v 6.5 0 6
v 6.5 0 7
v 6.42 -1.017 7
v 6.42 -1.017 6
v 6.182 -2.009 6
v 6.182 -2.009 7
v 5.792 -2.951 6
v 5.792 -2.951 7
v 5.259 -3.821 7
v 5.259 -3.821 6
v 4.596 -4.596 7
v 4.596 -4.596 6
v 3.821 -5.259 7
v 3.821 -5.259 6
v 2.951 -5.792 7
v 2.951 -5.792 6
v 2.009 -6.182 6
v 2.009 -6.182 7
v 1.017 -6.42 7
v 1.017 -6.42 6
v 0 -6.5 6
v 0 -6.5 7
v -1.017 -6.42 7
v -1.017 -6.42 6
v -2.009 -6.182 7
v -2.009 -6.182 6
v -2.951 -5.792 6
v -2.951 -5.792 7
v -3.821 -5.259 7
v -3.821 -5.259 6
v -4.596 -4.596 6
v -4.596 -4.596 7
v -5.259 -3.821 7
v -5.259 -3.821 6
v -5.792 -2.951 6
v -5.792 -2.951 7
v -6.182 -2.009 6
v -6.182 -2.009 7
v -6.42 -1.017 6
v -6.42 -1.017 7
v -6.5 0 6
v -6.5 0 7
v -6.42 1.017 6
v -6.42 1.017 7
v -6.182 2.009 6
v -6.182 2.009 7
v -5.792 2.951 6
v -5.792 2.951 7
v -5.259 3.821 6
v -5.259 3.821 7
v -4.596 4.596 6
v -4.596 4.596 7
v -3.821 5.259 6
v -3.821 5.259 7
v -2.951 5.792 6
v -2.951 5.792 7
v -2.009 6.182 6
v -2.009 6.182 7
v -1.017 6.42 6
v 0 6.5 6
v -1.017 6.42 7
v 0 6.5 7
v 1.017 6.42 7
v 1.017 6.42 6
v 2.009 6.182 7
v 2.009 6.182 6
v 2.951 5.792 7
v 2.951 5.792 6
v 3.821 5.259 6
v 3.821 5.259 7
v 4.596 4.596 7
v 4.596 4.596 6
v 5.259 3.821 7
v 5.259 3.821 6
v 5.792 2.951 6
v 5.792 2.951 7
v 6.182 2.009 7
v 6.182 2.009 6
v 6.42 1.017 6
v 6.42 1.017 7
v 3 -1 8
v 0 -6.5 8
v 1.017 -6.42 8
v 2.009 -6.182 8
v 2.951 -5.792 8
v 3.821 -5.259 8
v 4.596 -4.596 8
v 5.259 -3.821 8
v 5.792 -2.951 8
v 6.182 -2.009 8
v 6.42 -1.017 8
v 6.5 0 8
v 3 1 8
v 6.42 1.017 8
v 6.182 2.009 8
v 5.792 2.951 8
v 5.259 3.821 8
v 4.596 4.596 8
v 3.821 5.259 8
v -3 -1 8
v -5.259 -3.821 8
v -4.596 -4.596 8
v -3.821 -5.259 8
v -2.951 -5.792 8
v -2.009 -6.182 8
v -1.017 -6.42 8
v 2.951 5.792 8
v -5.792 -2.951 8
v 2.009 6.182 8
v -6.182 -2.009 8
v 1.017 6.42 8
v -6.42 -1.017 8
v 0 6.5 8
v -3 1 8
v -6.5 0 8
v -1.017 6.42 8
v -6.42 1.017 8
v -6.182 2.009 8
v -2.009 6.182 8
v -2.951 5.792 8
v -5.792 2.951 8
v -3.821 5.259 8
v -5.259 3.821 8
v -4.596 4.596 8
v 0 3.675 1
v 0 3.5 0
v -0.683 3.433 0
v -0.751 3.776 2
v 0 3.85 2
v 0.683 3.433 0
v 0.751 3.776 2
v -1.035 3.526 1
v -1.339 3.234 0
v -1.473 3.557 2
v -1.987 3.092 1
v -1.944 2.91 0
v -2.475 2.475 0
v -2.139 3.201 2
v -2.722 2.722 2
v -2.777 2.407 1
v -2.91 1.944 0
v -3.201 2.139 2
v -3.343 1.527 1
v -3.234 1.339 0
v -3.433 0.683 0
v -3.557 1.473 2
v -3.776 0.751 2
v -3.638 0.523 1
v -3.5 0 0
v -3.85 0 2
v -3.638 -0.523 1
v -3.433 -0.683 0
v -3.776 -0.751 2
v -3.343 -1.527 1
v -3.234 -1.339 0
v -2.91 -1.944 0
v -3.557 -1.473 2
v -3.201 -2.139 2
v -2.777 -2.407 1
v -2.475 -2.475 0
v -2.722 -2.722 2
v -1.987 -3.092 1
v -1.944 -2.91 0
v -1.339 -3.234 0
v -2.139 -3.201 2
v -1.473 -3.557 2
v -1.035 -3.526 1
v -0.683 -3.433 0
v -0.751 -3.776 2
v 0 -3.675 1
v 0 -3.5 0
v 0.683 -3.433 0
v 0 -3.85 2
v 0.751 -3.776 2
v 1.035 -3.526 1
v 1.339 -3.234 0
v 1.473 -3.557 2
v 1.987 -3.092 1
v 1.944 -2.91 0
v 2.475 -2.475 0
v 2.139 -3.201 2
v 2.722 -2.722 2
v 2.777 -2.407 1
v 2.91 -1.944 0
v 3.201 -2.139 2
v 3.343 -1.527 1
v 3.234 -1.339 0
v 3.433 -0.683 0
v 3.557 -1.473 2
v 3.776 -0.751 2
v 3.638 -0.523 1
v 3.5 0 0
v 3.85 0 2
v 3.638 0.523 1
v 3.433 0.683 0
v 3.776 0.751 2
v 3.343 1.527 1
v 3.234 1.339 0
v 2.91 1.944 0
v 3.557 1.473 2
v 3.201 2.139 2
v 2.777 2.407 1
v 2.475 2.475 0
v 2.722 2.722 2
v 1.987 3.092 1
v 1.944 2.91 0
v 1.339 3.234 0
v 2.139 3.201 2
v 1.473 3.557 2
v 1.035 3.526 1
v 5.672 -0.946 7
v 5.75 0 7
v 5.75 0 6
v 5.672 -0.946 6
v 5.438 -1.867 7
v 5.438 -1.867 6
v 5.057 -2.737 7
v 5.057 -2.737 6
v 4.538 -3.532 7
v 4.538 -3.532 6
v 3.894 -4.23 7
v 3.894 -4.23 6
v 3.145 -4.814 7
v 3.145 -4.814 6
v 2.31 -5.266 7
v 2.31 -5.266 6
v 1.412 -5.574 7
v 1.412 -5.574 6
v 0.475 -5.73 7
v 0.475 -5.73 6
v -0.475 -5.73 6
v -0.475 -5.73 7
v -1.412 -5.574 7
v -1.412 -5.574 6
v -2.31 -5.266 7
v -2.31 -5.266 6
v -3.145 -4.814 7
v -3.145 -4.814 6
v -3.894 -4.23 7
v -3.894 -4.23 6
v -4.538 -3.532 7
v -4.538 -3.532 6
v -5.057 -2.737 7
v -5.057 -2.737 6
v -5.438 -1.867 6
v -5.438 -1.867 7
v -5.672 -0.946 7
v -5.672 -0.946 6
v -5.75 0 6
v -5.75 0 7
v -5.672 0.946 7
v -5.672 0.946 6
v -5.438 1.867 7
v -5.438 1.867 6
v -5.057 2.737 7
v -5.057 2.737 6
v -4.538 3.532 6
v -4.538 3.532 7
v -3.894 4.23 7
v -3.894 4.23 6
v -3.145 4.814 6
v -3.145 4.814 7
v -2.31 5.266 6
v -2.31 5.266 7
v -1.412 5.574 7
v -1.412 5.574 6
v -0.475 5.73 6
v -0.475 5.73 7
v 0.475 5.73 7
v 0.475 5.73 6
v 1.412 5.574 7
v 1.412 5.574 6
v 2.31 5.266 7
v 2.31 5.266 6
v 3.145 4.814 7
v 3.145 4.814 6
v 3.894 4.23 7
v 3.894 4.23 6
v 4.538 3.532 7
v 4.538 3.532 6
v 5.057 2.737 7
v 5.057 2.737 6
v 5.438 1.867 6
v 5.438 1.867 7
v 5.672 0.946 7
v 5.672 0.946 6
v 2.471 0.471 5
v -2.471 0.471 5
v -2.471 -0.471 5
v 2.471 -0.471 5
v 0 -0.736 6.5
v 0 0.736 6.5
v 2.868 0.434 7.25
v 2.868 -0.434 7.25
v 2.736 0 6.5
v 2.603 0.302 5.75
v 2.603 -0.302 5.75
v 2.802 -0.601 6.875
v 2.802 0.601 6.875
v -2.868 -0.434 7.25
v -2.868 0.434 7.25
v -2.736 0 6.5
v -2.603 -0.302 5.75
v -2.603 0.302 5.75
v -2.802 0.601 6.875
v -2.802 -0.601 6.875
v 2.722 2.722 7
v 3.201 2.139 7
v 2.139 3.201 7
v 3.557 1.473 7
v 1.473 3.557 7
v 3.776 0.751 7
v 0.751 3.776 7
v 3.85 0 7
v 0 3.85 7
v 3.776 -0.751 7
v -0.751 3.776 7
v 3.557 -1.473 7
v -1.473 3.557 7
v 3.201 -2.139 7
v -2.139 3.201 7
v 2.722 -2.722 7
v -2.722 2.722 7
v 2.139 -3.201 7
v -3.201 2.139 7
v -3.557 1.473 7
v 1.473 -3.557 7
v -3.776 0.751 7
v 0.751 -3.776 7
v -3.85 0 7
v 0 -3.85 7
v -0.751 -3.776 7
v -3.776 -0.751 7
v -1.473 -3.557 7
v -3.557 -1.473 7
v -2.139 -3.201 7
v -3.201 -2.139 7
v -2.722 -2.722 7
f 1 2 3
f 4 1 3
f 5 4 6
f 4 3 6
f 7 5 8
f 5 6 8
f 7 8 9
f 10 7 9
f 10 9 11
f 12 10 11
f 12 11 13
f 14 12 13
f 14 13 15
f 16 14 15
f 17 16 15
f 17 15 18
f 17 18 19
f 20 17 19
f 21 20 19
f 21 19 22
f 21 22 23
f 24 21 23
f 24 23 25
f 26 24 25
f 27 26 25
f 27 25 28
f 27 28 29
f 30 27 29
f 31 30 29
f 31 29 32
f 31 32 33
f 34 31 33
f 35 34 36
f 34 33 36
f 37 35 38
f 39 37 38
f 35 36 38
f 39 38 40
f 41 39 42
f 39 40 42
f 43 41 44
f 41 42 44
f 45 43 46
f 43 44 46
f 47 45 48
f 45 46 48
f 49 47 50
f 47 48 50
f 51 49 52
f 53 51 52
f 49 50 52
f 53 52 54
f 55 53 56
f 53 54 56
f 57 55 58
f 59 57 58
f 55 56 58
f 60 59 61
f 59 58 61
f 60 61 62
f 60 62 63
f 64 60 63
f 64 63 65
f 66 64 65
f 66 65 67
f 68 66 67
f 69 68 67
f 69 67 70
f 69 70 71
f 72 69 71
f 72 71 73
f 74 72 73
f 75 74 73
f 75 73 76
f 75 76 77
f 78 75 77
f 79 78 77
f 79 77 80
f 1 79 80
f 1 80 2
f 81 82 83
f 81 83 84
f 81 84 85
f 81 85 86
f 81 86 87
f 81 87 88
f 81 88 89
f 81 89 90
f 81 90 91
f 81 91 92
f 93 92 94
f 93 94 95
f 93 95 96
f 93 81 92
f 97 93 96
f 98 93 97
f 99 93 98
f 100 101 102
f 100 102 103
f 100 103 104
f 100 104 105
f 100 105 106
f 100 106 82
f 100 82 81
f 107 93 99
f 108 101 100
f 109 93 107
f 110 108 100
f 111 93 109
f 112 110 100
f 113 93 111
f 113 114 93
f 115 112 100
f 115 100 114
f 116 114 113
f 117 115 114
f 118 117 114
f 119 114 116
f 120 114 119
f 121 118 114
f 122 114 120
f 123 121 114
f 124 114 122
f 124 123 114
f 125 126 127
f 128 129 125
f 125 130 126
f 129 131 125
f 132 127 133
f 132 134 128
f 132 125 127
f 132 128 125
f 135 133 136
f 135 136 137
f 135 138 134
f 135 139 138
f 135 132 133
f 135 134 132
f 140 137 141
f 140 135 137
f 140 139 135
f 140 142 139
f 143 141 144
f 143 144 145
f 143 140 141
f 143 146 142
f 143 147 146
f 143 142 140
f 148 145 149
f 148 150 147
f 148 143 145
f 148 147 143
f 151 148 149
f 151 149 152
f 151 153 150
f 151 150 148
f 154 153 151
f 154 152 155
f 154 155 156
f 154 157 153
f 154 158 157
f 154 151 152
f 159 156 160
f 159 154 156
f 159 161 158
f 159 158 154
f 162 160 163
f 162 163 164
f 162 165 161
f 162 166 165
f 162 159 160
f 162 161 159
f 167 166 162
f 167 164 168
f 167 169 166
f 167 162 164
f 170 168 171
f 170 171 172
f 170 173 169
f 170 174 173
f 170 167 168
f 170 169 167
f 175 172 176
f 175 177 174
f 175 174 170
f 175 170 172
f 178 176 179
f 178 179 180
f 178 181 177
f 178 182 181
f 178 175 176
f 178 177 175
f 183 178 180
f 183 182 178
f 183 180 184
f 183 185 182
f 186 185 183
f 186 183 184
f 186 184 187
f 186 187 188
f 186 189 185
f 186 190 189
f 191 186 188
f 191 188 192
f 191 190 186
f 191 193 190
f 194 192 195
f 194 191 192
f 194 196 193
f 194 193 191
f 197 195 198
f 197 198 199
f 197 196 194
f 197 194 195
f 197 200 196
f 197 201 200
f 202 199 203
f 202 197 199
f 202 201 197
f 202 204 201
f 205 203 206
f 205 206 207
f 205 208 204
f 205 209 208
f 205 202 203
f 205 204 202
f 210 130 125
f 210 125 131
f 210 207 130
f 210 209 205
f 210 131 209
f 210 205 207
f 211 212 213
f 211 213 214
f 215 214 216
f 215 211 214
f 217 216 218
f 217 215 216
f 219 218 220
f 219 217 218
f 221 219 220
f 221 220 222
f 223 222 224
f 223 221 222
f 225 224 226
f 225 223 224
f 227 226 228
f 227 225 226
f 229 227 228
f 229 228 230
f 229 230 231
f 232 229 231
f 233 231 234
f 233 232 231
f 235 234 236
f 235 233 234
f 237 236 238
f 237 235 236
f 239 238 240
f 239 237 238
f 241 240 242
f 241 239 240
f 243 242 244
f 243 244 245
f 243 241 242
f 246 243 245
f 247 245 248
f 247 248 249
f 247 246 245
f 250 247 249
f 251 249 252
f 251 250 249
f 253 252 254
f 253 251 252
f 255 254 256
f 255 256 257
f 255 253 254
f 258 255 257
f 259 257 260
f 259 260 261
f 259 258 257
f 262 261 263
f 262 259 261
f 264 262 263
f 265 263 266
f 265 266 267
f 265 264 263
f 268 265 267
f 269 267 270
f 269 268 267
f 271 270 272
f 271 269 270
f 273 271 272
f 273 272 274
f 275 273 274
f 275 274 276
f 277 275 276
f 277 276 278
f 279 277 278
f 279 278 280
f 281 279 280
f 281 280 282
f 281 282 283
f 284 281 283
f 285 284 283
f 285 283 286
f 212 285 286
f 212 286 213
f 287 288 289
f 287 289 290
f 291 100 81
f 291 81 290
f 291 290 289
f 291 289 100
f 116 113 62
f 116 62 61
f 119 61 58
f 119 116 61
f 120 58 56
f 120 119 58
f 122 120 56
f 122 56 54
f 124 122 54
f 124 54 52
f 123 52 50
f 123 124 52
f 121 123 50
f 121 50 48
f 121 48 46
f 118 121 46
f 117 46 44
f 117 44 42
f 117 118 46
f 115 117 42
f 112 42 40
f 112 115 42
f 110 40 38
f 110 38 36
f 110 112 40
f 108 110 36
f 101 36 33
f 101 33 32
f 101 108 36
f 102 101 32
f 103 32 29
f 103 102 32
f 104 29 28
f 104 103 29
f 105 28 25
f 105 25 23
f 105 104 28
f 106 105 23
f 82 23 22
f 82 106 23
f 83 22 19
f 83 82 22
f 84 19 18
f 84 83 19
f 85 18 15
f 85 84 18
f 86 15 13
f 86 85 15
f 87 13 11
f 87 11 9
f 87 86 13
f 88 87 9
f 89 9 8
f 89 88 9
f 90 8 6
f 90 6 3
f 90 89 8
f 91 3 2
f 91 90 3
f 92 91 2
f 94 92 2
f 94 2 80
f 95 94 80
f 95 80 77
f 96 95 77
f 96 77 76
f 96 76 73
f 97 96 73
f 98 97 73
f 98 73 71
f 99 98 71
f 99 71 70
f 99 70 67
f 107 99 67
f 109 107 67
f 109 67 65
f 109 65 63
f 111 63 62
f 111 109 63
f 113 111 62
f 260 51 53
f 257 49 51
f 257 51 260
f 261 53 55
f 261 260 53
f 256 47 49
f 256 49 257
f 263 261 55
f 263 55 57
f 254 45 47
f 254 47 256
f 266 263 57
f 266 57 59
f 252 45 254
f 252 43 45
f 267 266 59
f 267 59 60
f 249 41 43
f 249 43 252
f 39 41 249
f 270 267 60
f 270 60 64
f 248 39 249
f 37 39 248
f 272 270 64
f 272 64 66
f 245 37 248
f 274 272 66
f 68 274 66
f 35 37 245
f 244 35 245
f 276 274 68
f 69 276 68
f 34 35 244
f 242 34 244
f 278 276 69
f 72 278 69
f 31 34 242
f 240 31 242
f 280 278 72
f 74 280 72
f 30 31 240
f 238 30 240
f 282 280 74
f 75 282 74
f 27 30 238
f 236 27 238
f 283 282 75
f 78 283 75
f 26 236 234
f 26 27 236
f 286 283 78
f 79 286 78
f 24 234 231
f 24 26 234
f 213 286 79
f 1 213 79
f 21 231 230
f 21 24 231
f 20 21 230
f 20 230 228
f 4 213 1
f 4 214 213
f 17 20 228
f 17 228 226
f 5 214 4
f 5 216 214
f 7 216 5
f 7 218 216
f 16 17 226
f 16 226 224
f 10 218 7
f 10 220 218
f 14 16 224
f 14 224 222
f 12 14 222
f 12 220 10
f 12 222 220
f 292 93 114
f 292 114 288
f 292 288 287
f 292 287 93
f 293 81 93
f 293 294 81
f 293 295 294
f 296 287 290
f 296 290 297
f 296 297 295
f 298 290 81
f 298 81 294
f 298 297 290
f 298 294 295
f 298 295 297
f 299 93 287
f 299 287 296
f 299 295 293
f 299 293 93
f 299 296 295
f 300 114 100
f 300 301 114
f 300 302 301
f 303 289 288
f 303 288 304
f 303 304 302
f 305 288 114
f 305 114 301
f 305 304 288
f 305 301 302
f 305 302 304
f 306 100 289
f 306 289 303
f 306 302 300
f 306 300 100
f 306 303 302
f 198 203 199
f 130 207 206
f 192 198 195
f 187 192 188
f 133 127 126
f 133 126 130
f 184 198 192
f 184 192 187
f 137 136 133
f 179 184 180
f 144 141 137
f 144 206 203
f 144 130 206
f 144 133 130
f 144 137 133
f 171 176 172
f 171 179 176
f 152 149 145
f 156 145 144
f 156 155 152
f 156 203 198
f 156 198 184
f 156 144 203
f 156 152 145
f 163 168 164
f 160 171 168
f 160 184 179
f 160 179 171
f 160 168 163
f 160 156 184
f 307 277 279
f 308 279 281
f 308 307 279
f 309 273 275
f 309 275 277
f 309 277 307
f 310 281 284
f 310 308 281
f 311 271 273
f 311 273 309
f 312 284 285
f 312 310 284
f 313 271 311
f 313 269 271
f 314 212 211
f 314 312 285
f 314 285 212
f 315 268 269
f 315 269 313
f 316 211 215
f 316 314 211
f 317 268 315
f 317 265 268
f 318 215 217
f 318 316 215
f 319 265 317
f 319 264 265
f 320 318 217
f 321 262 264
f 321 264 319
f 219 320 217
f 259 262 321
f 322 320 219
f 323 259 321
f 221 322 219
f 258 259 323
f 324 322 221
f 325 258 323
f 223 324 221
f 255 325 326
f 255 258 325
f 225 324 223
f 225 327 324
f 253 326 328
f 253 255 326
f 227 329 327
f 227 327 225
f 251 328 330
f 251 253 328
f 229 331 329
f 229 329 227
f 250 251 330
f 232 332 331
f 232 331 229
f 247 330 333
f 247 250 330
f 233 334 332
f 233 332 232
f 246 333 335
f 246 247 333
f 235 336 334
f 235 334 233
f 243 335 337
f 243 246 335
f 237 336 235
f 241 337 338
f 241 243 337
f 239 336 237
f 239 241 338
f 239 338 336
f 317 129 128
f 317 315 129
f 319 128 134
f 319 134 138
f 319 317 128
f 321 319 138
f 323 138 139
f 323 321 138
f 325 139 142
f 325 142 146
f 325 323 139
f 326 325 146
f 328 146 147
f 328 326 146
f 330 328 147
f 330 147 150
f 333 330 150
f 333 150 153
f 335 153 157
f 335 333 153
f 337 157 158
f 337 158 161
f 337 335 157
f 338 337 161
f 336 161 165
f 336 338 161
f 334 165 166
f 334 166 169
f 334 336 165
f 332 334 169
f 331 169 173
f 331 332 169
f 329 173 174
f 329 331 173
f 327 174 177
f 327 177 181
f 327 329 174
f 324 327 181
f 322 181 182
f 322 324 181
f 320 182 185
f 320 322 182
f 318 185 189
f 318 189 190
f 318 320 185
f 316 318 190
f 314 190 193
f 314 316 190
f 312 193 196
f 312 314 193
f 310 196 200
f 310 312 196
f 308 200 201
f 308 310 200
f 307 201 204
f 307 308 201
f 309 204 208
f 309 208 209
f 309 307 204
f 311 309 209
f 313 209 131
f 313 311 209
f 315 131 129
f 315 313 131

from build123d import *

# Parameters (mm, degrees)
F2_R     = 6.5
F2_R_2   = 5.75
F3_DEPTH = 1
F4_W     = 6
F4_H     = 2
F5_DEPTH = 3
F5_TAPER = 10


with BuildPart() as f1:
    # F0 (on Right) → F1 (revolve)
    with BuildSketch(Plane.YZ):
        Polygon((0, 8), (0, 0), (3.5, 0), (3.85, 2), (3.85, 7), (6.5, 7), (6.5, 8), align=None)
    revolve(axis=Axis((0, 0, 6.5057562609), (0, 0, 1)))

    # F2 (on face) → F3 (join)
    with BuildSketch(Plane(origin=(0, 0, 7), x_dir=(1, 0, 0), z_dir=(0, 0, -1))):
        Circle(F2_R)
        Circle(F2_R_2, mode=Mode.SUBTRACT)
    extrude(amount=F3_DEPTH)

    # F4 (on face) → F5 (cut)
    with BuildSketch(Plane.XY.offset(8)):
        Rectangle(F4_W, F4_H)
    extrude(amount=-F5_DEPTH, taper=F5_TAPER, mode=Mode.SUBTRACT)


solid = f1.part
